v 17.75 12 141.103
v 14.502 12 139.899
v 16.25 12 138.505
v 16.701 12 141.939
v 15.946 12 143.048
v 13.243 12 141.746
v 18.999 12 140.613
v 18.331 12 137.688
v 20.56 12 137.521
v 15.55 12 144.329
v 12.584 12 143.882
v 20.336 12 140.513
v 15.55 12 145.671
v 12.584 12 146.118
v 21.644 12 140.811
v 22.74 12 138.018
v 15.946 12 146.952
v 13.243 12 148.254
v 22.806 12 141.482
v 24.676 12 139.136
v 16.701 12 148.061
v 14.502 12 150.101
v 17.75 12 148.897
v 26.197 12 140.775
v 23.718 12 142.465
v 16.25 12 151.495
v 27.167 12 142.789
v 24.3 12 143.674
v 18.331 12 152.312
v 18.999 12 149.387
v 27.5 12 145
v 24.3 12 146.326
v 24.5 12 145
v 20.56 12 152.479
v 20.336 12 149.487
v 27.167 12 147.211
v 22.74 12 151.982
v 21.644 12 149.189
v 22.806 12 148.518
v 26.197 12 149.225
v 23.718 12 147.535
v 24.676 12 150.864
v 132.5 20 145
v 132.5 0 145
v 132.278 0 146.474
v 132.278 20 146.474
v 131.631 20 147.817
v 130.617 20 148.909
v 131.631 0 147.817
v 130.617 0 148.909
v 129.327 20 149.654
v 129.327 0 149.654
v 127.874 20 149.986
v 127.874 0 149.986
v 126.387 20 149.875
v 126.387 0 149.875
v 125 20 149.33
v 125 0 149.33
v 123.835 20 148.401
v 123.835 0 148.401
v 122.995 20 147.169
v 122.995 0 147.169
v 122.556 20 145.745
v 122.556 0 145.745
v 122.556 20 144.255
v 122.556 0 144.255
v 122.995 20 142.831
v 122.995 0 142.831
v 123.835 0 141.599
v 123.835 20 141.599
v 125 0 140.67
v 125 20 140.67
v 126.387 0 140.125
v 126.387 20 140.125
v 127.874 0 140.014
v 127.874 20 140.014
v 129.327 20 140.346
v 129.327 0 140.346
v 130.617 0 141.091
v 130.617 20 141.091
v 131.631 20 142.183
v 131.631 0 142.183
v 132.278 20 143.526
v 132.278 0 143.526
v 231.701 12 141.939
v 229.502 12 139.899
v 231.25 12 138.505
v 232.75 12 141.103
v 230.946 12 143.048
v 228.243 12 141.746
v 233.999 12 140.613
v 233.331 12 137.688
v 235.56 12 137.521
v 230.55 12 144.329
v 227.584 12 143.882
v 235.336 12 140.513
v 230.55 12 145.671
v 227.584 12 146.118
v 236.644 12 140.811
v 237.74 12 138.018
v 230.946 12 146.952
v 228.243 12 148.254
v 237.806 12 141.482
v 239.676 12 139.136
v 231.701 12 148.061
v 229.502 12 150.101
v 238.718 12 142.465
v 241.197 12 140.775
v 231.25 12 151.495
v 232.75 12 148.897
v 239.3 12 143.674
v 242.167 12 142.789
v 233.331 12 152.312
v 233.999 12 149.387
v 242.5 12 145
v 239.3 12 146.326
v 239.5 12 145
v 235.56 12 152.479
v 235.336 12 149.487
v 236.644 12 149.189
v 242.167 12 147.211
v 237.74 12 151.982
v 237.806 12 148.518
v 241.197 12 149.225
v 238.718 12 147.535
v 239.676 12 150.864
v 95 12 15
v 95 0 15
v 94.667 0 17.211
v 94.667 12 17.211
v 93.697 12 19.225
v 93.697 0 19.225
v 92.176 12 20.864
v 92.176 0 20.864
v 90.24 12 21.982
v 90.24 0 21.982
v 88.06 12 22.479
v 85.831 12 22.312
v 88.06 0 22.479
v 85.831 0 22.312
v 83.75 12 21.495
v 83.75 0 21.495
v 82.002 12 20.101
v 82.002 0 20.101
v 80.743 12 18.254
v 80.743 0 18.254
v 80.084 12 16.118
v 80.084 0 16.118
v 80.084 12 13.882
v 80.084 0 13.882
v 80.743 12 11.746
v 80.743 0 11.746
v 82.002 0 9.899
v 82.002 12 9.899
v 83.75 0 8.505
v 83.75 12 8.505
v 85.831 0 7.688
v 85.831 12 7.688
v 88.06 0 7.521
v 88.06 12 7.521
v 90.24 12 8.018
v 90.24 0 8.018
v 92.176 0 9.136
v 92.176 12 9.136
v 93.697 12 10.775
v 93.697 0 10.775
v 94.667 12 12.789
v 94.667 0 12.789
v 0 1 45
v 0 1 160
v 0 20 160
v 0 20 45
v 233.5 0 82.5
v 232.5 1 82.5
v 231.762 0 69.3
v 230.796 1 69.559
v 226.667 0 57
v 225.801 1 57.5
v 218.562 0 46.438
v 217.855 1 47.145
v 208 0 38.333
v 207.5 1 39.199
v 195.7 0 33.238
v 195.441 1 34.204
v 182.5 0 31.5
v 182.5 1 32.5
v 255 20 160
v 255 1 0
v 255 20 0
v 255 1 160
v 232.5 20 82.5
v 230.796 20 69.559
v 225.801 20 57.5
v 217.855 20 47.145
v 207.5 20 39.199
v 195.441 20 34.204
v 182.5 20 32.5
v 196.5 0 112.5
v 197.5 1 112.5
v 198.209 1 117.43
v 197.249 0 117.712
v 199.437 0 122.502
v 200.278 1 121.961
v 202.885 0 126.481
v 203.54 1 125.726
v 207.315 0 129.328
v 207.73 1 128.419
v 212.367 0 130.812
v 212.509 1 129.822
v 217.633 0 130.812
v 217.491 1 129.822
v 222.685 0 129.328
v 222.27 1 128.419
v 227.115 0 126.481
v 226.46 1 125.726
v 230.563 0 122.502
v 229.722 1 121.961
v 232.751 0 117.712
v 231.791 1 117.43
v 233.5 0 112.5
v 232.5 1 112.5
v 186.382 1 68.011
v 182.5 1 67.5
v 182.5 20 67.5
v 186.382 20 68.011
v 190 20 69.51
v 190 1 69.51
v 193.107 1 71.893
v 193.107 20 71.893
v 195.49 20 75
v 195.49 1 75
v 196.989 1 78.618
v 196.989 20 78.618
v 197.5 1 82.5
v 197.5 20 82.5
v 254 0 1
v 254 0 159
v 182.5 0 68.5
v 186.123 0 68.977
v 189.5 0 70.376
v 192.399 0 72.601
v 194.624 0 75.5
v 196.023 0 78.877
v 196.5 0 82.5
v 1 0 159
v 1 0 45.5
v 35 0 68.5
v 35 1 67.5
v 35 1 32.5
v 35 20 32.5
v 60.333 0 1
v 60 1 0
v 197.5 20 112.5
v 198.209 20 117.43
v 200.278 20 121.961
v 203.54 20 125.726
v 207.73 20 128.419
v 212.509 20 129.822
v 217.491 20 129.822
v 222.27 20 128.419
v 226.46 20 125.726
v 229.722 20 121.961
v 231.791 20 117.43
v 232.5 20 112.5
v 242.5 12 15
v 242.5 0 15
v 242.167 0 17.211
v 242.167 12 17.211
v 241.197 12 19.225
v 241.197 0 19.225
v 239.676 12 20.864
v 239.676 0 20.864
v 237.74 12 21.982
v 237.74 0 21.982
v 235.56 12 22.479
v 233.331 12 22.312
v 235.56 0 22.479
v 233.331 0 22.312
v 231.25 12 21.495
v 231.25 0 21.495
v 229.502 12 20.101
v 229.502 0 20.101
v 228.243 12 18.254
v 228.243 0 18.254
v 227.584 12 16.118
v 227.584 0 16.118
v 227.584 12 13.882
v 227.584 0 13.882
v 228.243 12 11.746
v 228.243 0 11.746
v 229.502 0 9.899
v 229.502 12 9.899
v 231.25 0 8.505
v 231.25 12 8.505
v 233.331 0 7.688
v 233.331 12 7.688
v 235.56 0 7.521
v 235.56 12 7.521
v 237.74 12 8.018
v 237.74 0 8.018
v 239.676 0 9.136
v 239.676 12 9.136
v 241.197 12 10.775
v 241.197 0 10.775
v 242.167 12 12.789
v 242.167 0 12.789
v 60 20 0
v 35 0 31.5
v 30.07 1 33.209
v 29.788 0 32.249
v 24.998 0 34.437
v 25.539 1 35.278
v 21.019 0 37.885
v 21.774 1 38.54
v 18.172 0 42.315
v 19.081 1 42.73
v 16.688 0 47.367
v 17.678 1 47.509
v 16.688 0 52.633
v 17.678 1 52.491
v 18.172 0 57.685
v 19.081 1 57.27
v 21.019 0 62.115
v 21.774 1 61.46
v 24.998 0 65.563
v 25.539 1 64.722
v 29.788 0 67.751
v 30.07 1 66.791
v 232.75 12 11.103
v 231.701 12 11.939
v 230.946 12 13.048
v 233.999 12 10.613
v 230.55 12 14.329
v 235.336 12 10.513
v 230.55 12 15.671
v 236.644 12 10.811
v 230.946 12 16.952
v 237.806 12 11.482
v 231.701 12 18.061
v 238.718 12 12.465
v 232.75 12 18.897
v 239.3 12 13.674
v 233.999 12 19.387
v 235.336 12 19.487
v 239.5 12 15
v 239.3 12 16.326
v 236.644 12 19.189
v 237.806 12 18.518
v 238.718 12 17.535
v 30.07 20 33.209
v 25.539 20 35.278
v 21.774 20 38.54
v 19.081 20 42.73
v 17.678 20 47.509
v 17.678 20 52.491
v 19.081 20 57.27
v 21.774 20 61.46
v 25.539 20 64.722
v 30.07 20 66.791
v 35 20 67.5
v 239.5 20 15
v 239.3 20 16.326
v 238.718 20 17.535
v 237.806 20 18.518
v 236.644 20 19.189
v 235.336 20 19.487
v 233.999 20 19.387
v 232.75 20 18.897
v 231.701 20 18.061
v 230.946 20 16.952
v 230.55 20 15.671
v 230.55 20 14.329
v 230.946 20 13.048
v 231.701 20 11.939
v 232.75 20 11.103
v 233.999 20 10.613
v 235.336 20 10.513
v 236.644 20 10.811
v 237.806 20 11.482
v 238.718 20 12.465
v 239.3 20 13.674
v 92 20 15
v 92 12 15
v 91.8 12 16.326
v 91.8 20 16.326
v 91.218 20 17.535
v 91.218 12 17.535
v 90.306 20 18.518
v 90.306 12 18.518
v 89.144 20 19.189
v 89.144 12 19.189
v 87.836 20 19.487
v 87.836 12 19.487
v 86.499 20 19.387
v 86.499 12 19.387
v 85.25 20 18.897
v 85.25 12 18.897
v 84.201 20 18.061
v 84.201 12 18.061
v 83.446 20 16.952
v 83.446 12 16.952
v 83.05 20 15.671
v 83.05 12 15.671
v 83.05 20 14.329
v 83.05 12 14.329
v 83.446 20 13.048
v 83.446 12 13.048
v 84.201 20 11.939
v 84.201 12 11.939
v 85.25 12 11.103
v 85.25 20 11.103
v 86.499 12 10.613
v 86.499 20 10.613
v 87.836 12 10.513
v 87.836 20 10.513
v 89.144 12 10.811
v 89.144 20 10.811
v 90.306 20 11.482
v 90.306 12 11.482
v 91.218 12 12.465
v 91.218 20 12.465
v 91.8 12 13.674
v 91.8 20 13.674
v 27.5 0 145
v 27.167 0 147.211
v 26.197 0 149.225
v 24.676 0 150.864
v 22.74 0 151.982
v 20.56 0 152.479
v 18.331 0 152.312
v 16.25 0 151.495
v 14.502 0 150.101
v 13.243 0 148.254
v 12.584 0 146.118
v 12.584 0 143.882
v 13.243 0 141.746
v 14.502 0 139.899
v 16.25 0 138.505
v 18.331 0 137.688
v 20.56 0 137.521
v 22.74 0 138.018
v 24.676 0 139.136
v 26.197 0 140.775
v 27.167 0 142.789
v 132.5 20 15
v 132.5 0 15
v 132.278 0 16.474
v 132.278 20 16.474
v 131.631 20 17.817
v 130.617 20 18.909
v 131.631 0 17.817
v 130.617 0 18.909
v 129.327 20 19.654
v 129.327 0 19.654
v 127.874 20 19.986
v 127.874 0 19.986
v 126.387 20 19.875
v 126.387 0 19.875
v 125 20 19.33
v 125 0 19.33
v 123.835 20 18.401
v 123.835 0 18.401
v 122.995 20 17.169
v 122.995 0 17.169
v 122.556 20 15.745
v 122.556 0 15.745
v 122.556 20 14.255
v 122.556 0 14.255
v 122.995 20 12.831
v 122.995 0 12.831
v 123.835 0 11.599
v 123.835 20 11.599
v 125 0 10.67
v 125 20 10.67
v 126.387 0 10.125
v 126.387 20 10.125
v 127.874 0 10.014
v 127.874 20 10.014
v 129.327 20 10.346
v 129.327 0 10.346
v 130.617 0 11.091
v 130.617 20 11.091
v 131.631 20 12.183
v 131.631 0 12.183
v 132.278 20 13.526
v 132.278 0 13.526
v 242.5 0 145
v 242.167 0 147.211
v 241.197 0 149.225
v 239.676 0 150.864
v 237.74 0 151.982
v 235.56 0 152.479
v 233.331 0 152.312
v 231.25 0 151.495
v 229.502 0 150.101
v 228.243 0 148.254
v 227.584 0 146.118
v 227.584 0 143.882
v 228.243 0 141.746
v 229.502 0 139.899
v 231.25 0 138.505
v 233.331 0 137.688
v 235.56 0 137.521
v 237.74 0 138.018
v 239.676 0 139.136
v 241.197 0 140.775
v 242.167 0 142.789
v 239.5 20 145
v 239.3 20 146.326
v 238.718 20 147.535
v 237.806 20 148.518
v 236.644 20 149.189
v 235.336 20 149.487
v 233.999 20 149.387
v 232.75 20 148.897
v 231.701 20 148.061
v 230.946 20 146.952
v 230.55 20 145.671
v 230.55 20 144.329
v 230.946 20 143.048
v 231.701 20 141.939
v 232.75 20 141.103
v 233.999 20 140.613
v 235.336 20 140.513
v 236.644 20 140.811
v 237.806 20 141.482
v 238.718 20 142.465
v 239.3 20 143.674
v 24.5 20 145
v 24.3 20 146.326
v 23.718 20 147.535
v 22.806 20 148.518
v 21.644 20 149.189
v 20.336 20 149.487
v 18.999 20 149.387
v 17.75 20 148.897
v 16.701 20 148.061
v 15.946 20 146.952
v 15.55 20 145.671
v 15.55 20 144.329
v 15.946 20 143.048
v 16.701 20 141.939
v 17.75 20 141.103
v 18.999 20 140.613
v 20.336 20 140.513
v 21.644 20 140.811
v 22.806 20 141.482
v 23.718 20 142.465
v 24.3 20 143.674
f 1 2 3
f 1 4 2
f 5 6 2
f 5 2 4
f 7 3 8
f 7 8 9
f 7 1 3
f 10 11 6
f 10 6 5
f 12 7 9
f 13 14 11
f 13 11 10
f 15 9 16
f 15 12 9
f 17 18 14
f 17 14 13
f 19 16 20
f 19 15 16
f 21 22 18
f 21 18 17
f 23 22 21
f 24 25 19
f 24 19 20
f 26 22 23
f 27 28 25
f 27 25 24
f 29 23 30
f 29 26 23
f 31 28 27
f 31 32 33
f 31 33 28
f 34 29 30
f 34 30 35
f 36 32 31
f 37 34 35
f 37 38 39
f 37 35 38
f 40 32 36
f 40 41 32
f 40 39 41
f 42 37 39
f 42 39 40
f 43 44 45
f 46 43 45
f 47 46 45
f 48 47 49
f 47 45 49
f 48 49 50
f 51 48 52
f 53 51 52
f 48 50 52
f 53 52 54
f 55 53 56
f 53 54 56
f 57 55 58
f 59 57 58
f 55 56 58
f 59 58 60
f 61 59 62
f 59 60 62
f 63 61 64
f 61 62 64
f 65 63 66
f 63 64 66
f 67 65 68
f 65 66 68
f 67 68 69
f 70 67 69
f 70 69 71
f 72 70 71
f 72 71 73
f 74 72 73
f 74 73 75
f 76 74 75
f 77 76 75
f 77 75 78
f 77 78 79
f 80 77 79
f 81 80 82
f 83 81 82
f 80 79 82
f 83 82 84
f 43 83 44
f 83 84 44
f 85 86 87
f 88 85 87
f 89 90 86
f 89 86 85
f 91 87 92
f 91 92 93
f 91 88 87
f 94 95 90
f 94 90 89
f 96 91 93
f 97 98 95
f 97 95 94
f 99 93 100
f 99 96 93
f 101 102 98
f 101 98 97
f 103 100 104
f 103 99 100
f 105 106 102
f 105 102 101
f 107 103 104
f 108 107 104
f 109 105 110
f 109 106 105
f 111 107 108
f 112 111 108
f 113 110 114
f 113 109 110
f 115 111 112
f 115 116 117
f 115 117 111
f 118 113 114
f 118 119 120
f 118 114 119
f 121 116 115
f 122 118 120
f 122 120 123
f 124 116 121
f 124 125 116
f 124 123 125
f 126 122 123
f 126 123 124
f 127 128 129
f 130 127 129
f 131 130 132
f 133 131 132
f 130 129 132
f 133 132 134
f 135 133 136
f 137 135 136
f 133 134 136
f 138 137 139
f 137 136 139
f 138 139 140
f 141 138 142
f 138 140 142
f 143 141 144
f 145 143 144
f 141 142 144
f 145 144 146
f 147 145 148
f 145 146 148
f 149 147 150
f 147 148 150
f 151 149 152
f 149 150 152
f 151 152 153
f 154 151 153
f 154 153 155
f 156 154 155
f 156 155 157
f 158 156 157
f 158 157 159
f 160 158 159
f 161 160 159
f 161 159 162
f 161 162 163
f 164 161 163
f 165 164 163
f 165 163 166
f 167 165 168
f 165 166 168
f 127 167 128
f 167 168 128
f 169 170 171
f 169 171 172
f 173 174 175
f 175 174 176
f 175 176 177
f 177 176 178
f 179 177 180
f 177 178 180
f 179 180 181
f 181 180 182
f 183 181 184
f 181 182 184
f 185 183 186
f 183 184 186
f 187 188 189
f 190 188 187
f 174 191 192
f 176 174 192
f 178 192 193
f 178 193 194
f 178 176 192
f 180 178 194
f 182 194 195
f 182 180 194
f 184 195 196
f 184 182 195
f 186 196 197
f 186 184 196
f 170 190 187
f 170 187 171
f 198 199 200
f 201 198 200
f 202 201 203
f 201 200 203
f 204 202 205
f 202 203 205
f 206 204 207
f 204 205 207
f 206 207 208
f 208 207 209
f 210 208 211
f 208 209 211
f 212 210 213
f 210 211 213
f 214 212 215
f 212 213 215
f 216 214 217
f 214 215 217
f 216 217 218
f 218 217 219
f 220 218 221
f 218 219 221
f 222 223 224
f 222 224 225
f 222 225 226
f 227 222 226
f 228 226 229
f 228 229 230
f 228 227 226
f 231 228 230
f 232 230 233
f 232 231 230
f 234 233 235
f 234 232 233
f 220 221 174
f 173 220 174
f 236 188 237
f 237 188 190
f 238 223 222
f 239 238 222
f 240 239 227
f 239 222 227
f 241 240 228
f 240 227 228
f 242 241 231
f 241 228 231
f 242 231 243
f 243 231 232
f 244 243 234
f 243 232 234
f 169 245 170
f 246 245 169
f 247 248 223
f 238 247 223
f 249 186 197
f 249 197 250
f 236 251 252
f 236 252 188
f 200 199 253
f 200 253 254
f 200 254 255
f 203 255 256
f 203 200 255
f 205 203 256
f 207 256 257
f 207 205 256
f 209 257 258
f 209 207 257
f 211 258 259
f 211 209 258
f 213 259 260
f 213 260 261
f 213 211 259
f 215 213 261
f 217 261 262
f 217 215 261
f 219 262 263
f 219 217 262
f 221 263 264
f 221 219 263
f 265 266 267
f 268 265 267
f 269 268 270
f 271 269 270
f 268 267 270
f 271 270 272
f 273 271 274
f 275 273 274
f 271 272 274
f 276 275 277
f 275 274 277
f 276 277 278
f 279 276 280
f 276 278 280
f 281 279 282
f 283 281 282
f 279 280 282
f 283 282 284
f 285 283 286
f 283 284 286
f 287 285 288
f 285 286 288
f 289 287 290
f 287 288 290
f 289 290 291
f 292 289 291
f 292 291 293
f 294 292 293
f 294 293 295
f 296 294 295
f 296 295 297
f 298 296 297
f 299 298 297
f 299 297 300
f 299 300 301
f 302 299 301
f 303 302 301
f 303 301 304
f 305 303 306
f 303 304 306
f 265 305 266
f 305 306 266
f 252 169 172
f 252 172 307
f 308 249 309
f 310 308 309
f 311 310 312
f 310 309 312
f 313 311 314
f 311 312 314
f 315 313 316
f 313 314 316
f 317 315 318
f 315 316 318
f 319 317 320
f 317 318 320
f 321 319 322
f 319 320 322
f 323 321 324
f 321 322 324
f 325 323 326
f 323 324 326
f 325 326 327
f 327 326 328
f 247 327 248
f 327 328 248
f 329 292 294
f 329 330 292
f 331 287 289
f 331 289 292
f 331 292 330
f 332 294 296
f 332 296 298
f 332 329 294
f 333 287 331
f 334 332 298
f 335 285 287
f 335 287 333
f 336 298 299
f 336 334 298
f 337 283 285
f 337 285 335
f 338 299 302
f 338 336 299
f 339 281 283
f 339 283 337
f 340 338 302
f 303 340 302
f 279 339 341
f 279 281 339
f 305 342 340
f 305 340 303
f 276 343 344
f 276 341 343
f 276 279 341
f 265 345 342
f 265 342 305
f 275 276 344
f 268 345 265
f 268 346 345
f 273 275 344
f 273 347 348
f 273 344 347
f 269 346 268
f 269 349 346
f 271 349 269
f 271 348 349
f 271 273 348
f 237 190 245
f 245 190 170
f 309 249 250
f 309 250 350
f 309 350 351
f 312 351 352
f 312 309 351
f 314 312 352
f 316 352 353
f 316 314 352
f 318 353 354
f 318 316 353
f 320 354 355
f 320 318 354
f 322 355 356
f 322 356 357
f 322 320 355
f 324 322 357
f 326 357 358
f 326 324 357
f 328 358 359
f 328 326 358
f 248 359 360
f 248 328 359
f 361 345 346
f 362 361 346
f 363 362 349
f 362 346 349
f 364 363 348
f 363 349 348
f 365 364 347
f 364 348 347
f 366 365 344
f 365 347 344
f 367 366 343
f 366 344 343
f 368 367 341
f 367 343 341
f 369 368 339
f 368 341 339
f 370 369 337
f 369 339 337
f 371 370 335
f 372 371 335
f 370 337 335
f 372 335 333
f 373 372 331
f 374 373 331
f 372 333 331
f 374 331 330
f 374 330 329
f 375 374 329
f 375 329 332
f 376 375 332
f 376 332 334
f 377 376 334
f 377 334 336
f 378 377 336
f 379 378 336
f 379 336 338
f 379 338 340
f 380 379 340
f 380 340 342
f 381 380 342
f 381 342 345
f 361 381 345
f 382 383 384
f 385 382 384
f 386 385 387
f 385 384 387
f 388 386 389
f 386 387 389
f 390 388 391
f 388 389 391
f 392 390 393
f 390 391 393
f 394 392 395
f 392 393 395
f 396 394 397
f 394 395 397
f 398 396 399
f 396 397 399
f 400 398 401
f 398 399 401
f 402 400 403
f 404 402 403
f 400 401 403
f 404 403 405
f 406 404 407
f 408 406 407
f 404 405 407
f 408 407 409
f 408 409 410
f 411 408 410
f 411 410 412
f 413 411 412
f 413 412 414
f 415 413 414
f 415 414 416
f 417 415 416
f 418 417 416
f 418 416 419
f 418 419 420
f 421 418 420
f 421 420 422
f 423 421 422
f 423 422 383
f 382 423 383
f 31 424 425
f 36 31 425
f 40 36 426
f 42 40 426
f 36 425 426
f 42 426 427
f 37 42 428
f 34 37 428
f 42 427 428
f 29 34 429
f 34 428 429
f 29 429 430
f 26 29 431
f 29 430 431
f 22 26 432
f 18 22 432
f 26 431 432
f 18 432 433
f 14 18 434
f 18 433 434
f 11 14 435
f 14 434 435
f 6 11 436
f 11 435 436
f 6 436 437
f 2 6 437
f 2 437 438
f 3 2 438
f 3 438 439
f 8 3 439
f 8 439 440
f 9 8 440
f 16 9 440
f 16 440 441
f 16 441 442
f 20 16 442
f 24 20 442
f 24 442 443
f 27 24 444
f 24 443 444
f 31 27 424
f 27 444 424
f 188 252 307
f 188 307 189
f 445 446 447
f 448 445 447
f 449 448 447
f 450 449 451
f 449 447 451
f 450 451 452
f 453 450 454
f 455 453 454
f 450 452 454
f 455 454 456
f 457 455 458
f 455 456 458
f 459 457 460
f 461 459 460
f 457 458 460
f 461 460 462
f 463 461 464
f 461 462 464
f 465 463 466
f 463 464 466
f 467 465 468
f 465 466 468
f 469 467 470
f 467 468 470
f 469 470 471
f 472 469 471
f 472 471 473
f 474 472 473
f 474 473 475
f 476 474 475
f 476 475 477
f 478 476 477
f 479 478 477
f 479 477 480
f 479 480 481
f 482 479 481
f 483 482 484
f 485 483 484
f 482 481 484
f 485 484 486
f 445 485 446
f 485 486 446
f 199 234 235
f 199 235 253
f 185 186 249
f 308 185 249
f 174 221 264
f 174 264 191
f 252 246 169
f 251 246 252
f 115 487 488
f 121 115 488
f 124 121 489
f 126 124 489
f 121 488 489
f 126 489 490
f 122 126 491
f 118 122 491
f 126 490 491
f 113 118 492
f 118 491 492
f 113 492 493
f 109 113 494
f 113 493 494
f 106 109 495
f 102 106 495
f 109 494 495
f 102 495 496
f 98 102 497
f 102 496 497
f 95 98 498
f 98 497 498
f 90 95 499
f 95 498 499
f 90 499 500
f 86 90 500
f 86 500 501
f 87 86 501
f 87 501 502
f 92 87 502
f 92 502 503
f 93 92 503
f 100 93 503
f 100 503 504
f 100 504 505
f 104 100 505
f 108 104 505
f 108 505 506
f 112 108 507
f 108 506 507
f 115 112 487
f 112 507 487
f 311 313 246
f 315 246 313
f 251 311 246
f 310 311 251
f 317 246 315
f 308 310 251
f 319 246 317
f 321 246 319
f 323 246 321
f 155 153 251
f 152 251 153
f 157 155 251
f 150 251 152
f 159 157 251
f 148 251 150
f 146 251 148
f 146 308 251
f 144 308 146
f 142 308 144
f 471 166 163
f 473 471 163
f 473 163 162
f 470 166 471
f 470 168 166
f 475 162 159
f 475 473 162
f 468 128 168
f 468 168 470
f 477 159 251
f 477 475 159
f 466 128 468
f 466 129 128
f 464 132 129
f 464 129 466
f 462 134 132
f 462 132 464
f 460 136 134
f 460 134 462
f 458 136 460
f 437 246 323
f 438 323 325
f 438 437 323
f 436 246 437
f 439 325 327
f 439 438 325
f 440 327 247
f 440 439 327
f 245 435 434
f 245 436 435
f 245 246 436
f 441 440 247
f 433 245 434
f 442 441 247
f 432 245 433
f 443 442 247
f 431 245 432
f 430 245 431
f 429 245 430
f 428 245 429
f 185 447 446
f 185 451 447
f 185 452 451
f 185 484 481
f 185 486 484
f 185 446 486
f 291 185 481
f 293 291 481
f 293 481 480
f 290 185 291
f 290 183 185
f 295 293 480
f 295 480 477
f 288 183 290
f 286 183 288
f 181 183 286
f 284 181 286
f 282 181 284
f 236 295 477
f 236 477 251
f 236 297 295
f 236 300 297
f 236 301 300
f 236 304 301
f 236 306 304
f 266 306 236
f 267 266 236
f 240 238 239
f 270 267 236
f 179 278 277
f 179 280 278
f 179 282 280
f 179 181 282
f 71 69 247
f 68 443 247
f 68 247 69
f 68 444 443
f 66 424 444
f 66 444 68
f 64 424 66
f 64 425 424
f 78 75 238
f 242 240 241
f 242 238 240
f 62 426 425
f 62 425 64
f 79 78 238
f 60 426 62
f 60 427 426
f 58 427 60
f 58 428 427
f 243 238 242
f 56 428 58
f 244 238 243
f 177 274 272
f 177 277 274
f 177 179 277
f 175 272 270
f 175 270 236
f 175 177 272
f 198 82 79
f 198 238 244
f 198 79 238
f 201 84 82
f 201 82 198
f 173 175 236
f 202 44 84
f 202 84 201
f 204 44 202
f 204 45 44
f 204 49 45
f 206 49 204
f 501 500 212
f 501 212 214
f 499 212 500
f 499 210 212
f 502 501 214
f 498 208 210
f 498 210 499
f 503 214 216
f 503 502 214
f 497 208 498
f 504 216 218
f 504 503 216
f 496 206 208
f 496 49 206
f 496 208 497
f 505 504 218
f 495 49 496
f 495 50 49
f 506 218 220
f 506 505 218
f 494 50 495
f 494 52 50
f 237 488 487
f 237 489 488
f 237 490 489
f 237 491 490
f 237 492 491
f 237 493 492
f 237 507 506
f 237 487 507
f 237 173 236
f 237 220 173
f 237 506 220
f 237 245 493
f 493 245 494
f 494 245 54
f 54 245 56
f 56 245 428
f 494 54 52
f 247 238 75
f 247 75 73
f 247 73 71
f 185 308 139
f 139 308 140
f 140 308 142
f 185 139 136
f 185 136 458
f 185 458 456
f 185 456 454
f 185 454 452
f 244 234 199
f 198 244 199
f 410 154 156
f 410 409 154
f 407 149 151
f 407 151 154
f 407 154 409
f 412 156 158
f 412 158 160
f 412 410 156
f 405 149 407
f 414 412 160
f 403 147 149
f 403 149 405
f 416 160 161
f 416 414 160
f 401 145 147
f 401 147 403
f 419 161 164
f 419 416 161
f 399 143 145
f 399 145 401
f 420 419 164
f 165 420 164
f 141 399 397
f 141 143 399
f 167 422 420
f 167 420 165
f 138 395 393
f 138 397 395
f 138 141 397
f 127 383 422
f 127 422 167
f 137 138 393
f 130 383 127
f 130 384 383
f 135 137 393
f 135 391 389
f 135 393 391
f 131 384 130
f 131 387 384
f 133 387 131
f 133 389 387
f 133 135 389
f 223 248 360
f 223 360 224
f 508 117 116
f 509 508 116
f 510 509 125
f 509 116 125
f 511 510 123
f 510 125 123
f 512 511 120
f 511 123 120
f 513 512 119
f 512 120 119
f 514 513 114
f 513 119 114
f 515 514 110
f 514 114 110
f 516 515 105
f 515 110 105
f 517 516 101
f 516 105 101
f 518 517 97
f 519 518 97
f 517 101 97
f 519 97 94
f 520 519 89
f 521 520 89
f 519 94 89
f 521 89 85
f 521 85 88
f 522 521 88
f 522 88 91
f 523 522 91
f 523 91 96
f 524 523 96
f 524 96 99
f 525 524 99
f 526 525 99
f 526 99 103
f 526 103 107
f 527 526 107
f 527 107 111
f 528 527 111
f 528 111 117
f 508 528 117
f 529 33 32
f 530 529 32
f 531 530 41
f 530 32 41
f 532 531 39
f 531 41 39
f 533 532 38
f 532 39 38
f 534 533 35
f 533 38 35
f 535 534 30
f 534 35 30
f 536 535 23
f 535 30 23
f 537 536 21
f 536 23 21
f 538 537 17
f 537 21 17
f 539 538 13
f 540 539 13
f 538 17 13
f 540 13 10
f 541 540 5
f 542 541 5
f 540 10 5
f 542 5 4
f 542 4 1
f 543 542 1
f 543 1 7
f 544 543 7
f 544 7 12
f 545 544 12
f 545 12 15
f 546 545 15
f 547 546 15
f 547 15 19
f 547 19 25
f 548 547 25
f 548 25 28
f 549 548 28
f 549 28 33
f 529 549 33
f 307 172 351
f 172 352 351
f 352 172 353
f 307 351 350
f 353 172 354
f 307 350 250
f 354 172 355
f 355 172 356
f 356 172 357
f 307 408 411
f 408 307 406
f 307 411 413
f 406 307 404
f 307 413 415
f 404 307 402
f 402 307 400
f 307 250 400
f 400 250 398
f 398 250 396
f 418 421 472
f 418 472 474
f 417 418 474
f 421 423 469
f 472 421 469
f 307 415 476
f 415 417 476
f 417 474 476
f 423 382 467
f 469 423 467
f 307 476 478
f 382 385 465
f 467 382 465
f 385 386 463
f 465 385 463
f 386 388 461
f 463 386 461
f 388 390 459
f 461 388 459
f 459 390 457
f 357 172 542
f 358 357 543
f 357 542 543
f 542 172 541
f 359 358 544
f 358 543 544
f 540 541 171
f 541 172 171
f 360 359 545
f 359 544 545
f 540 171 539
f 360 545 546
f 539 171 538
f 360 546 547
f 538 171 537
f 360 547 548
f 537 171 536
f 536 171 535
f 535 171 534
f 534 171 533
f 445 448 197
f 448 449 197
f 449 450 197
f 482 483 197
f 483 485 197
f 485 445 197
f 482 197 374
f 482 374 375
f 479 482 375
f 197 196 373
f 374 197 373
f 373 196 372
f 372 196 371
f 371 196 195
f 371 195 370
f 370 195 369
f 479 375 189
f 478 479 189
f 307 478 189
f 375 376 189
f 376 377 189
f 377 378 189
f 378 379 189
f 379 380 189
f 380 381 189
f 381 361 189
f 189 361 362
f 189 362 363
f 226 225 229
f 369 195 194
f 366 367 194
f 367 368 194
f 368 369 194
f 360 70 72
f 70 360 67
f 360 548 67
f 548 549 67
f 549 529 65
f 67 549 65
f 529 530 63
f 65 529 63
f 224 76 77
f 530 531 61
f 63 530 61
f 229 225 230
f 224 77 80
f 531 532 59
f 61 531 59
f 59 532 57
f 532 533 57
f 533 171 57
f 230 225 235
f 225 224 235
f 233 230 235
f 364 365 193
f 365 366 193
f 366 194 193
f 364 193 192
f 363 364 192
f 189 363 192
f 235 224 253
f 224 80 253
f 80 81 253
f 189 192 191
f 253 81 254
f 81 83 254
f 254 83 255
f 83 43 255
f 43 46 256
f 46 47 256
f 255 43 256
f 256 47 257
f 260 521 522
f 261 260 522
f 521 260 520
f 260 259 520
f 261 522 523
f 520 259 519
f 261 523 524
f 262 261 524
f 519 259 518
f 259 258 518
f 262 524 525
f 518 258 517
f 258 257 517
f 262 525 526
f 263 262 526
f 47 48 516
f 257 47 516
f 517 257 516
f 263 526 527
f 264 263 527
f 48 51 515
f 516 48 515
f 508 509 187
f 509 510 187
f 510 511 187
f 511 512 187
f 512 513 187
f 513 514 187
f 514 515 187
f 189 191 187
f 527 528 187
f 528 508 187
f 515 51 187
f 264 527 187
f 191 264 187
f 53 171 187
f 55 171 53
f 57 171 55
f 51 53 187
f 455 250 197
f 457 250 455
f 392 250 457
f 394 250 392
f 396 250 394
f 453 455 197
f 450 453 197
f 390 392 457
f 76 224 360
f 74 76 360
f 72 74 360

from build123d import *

# Parameters (mm, degrees)
F0_R     = 5
F1_DEPTH = 20
F2_R     = 7.5
F2_R_2   = 4.5
F3_DEPTH = 12
F4_DEPTH = 25
F5_SIZE2 = 1
F5_SIZE  = 1


with BuildPart() as f1:
    # F0 (on Front) → F1 (new body)
    with BuildSketch(Plane.XZ):
        Polygon((0, 45), (60, 0), (255, 0), (255, 160), (0, 160), align=None)
        with Locations((127.5, 15)):
            Circle(F0_R, mode=Mode.SUBTRACT)
        with BuildLine():
            ThreePointArc((35, 32.5), (17.5, 50), (35, 67.5))
            Line((35, 67.5), (182.5, 67.5))
            ThreePointArc((182.5, 67.5), (193.106602, 71.893398), (197.5, 82.5))
            Line((197.5, 82.5), (197.5, 112.5))
            ThreePointArc((197.5, 112.5), (215, 130), (232.5, 112.5))
            Line((232.5, 112.5), (232.5, 82.5))
            ThreePointArc((232.5, 82.5), (217.855339, 47.144661), (182.5, 32.5))
            Line((182.5, 32.5), (35, 32.5))
        make_face(mode=Mode.SUBTRACT)
        with Locations((127.5, 145)):
            Circle(F0_R, mode=Mode.SUBTRACT)
    extrude(amount=-F1_DEPTH)

    # F2 (on face) → F3 (cut)
    with BuildSketch(Plane.XZ):
        with Locations((20, 145)):
            Circle(F2_R)
        with Locations((20, 145)):
            Circle(F2_R_2, mode=Mode.SUBTRACT)
        with Locations((235, 145)):
            Circle(F2_R)
        with Locations((235, 145)):
            Circle(F2_R_2, mode=Mode.SUBTRACT)
        with Locations((235, 15)):
            Circle(F2_R)
        with Locations((235, 15)):
            Circle(F2_R_2, mode=Mode.SUBTRACT)
        with Locations((87.5, 15)):
            Circle(F2_R)
        with Locations((87.5, 15)):
            Circle(F2_R_2, mode=Mode.SUBTRACT)
    extrude(amount=-F3_DEPTH, mode=Mode.SUBTRACT)

    # F2 (on face) → F4 (cut)
    with BuildSketch(Plane.XZ):
        with Locations((20, 145)):
            Circle(F2_R_2)
        with Locations((235, 145)):
            Circle(F2_R_2)
        with Locations((87.5, 15)):
            Circle(F2_R_2)
        with Locations((235, 15)):
            Circle(F2_R_2)
    extrude(amount=-F4_DEPTH, mode=Mode.SUBTRACT)

    # F5
    f5_edges = [f1.edges().sort_by_distance(p)[0] for p in [
        (157.5, 0, 0),
        (255, 0, 80),
        (127.5, 0, 160),
        (0, 0, 102.5),
        (30, 0, 22.5),
        (108.75, 0, 67.5),
        (17.5, 0, 50),
        (108.75, 0, 32.5),
        (217.855339, 0, 47.144661),
    ]]
    chamfer(f5_edges, length=F5_SIZE, length2=F5_SIZE2)


solid = f1.part
